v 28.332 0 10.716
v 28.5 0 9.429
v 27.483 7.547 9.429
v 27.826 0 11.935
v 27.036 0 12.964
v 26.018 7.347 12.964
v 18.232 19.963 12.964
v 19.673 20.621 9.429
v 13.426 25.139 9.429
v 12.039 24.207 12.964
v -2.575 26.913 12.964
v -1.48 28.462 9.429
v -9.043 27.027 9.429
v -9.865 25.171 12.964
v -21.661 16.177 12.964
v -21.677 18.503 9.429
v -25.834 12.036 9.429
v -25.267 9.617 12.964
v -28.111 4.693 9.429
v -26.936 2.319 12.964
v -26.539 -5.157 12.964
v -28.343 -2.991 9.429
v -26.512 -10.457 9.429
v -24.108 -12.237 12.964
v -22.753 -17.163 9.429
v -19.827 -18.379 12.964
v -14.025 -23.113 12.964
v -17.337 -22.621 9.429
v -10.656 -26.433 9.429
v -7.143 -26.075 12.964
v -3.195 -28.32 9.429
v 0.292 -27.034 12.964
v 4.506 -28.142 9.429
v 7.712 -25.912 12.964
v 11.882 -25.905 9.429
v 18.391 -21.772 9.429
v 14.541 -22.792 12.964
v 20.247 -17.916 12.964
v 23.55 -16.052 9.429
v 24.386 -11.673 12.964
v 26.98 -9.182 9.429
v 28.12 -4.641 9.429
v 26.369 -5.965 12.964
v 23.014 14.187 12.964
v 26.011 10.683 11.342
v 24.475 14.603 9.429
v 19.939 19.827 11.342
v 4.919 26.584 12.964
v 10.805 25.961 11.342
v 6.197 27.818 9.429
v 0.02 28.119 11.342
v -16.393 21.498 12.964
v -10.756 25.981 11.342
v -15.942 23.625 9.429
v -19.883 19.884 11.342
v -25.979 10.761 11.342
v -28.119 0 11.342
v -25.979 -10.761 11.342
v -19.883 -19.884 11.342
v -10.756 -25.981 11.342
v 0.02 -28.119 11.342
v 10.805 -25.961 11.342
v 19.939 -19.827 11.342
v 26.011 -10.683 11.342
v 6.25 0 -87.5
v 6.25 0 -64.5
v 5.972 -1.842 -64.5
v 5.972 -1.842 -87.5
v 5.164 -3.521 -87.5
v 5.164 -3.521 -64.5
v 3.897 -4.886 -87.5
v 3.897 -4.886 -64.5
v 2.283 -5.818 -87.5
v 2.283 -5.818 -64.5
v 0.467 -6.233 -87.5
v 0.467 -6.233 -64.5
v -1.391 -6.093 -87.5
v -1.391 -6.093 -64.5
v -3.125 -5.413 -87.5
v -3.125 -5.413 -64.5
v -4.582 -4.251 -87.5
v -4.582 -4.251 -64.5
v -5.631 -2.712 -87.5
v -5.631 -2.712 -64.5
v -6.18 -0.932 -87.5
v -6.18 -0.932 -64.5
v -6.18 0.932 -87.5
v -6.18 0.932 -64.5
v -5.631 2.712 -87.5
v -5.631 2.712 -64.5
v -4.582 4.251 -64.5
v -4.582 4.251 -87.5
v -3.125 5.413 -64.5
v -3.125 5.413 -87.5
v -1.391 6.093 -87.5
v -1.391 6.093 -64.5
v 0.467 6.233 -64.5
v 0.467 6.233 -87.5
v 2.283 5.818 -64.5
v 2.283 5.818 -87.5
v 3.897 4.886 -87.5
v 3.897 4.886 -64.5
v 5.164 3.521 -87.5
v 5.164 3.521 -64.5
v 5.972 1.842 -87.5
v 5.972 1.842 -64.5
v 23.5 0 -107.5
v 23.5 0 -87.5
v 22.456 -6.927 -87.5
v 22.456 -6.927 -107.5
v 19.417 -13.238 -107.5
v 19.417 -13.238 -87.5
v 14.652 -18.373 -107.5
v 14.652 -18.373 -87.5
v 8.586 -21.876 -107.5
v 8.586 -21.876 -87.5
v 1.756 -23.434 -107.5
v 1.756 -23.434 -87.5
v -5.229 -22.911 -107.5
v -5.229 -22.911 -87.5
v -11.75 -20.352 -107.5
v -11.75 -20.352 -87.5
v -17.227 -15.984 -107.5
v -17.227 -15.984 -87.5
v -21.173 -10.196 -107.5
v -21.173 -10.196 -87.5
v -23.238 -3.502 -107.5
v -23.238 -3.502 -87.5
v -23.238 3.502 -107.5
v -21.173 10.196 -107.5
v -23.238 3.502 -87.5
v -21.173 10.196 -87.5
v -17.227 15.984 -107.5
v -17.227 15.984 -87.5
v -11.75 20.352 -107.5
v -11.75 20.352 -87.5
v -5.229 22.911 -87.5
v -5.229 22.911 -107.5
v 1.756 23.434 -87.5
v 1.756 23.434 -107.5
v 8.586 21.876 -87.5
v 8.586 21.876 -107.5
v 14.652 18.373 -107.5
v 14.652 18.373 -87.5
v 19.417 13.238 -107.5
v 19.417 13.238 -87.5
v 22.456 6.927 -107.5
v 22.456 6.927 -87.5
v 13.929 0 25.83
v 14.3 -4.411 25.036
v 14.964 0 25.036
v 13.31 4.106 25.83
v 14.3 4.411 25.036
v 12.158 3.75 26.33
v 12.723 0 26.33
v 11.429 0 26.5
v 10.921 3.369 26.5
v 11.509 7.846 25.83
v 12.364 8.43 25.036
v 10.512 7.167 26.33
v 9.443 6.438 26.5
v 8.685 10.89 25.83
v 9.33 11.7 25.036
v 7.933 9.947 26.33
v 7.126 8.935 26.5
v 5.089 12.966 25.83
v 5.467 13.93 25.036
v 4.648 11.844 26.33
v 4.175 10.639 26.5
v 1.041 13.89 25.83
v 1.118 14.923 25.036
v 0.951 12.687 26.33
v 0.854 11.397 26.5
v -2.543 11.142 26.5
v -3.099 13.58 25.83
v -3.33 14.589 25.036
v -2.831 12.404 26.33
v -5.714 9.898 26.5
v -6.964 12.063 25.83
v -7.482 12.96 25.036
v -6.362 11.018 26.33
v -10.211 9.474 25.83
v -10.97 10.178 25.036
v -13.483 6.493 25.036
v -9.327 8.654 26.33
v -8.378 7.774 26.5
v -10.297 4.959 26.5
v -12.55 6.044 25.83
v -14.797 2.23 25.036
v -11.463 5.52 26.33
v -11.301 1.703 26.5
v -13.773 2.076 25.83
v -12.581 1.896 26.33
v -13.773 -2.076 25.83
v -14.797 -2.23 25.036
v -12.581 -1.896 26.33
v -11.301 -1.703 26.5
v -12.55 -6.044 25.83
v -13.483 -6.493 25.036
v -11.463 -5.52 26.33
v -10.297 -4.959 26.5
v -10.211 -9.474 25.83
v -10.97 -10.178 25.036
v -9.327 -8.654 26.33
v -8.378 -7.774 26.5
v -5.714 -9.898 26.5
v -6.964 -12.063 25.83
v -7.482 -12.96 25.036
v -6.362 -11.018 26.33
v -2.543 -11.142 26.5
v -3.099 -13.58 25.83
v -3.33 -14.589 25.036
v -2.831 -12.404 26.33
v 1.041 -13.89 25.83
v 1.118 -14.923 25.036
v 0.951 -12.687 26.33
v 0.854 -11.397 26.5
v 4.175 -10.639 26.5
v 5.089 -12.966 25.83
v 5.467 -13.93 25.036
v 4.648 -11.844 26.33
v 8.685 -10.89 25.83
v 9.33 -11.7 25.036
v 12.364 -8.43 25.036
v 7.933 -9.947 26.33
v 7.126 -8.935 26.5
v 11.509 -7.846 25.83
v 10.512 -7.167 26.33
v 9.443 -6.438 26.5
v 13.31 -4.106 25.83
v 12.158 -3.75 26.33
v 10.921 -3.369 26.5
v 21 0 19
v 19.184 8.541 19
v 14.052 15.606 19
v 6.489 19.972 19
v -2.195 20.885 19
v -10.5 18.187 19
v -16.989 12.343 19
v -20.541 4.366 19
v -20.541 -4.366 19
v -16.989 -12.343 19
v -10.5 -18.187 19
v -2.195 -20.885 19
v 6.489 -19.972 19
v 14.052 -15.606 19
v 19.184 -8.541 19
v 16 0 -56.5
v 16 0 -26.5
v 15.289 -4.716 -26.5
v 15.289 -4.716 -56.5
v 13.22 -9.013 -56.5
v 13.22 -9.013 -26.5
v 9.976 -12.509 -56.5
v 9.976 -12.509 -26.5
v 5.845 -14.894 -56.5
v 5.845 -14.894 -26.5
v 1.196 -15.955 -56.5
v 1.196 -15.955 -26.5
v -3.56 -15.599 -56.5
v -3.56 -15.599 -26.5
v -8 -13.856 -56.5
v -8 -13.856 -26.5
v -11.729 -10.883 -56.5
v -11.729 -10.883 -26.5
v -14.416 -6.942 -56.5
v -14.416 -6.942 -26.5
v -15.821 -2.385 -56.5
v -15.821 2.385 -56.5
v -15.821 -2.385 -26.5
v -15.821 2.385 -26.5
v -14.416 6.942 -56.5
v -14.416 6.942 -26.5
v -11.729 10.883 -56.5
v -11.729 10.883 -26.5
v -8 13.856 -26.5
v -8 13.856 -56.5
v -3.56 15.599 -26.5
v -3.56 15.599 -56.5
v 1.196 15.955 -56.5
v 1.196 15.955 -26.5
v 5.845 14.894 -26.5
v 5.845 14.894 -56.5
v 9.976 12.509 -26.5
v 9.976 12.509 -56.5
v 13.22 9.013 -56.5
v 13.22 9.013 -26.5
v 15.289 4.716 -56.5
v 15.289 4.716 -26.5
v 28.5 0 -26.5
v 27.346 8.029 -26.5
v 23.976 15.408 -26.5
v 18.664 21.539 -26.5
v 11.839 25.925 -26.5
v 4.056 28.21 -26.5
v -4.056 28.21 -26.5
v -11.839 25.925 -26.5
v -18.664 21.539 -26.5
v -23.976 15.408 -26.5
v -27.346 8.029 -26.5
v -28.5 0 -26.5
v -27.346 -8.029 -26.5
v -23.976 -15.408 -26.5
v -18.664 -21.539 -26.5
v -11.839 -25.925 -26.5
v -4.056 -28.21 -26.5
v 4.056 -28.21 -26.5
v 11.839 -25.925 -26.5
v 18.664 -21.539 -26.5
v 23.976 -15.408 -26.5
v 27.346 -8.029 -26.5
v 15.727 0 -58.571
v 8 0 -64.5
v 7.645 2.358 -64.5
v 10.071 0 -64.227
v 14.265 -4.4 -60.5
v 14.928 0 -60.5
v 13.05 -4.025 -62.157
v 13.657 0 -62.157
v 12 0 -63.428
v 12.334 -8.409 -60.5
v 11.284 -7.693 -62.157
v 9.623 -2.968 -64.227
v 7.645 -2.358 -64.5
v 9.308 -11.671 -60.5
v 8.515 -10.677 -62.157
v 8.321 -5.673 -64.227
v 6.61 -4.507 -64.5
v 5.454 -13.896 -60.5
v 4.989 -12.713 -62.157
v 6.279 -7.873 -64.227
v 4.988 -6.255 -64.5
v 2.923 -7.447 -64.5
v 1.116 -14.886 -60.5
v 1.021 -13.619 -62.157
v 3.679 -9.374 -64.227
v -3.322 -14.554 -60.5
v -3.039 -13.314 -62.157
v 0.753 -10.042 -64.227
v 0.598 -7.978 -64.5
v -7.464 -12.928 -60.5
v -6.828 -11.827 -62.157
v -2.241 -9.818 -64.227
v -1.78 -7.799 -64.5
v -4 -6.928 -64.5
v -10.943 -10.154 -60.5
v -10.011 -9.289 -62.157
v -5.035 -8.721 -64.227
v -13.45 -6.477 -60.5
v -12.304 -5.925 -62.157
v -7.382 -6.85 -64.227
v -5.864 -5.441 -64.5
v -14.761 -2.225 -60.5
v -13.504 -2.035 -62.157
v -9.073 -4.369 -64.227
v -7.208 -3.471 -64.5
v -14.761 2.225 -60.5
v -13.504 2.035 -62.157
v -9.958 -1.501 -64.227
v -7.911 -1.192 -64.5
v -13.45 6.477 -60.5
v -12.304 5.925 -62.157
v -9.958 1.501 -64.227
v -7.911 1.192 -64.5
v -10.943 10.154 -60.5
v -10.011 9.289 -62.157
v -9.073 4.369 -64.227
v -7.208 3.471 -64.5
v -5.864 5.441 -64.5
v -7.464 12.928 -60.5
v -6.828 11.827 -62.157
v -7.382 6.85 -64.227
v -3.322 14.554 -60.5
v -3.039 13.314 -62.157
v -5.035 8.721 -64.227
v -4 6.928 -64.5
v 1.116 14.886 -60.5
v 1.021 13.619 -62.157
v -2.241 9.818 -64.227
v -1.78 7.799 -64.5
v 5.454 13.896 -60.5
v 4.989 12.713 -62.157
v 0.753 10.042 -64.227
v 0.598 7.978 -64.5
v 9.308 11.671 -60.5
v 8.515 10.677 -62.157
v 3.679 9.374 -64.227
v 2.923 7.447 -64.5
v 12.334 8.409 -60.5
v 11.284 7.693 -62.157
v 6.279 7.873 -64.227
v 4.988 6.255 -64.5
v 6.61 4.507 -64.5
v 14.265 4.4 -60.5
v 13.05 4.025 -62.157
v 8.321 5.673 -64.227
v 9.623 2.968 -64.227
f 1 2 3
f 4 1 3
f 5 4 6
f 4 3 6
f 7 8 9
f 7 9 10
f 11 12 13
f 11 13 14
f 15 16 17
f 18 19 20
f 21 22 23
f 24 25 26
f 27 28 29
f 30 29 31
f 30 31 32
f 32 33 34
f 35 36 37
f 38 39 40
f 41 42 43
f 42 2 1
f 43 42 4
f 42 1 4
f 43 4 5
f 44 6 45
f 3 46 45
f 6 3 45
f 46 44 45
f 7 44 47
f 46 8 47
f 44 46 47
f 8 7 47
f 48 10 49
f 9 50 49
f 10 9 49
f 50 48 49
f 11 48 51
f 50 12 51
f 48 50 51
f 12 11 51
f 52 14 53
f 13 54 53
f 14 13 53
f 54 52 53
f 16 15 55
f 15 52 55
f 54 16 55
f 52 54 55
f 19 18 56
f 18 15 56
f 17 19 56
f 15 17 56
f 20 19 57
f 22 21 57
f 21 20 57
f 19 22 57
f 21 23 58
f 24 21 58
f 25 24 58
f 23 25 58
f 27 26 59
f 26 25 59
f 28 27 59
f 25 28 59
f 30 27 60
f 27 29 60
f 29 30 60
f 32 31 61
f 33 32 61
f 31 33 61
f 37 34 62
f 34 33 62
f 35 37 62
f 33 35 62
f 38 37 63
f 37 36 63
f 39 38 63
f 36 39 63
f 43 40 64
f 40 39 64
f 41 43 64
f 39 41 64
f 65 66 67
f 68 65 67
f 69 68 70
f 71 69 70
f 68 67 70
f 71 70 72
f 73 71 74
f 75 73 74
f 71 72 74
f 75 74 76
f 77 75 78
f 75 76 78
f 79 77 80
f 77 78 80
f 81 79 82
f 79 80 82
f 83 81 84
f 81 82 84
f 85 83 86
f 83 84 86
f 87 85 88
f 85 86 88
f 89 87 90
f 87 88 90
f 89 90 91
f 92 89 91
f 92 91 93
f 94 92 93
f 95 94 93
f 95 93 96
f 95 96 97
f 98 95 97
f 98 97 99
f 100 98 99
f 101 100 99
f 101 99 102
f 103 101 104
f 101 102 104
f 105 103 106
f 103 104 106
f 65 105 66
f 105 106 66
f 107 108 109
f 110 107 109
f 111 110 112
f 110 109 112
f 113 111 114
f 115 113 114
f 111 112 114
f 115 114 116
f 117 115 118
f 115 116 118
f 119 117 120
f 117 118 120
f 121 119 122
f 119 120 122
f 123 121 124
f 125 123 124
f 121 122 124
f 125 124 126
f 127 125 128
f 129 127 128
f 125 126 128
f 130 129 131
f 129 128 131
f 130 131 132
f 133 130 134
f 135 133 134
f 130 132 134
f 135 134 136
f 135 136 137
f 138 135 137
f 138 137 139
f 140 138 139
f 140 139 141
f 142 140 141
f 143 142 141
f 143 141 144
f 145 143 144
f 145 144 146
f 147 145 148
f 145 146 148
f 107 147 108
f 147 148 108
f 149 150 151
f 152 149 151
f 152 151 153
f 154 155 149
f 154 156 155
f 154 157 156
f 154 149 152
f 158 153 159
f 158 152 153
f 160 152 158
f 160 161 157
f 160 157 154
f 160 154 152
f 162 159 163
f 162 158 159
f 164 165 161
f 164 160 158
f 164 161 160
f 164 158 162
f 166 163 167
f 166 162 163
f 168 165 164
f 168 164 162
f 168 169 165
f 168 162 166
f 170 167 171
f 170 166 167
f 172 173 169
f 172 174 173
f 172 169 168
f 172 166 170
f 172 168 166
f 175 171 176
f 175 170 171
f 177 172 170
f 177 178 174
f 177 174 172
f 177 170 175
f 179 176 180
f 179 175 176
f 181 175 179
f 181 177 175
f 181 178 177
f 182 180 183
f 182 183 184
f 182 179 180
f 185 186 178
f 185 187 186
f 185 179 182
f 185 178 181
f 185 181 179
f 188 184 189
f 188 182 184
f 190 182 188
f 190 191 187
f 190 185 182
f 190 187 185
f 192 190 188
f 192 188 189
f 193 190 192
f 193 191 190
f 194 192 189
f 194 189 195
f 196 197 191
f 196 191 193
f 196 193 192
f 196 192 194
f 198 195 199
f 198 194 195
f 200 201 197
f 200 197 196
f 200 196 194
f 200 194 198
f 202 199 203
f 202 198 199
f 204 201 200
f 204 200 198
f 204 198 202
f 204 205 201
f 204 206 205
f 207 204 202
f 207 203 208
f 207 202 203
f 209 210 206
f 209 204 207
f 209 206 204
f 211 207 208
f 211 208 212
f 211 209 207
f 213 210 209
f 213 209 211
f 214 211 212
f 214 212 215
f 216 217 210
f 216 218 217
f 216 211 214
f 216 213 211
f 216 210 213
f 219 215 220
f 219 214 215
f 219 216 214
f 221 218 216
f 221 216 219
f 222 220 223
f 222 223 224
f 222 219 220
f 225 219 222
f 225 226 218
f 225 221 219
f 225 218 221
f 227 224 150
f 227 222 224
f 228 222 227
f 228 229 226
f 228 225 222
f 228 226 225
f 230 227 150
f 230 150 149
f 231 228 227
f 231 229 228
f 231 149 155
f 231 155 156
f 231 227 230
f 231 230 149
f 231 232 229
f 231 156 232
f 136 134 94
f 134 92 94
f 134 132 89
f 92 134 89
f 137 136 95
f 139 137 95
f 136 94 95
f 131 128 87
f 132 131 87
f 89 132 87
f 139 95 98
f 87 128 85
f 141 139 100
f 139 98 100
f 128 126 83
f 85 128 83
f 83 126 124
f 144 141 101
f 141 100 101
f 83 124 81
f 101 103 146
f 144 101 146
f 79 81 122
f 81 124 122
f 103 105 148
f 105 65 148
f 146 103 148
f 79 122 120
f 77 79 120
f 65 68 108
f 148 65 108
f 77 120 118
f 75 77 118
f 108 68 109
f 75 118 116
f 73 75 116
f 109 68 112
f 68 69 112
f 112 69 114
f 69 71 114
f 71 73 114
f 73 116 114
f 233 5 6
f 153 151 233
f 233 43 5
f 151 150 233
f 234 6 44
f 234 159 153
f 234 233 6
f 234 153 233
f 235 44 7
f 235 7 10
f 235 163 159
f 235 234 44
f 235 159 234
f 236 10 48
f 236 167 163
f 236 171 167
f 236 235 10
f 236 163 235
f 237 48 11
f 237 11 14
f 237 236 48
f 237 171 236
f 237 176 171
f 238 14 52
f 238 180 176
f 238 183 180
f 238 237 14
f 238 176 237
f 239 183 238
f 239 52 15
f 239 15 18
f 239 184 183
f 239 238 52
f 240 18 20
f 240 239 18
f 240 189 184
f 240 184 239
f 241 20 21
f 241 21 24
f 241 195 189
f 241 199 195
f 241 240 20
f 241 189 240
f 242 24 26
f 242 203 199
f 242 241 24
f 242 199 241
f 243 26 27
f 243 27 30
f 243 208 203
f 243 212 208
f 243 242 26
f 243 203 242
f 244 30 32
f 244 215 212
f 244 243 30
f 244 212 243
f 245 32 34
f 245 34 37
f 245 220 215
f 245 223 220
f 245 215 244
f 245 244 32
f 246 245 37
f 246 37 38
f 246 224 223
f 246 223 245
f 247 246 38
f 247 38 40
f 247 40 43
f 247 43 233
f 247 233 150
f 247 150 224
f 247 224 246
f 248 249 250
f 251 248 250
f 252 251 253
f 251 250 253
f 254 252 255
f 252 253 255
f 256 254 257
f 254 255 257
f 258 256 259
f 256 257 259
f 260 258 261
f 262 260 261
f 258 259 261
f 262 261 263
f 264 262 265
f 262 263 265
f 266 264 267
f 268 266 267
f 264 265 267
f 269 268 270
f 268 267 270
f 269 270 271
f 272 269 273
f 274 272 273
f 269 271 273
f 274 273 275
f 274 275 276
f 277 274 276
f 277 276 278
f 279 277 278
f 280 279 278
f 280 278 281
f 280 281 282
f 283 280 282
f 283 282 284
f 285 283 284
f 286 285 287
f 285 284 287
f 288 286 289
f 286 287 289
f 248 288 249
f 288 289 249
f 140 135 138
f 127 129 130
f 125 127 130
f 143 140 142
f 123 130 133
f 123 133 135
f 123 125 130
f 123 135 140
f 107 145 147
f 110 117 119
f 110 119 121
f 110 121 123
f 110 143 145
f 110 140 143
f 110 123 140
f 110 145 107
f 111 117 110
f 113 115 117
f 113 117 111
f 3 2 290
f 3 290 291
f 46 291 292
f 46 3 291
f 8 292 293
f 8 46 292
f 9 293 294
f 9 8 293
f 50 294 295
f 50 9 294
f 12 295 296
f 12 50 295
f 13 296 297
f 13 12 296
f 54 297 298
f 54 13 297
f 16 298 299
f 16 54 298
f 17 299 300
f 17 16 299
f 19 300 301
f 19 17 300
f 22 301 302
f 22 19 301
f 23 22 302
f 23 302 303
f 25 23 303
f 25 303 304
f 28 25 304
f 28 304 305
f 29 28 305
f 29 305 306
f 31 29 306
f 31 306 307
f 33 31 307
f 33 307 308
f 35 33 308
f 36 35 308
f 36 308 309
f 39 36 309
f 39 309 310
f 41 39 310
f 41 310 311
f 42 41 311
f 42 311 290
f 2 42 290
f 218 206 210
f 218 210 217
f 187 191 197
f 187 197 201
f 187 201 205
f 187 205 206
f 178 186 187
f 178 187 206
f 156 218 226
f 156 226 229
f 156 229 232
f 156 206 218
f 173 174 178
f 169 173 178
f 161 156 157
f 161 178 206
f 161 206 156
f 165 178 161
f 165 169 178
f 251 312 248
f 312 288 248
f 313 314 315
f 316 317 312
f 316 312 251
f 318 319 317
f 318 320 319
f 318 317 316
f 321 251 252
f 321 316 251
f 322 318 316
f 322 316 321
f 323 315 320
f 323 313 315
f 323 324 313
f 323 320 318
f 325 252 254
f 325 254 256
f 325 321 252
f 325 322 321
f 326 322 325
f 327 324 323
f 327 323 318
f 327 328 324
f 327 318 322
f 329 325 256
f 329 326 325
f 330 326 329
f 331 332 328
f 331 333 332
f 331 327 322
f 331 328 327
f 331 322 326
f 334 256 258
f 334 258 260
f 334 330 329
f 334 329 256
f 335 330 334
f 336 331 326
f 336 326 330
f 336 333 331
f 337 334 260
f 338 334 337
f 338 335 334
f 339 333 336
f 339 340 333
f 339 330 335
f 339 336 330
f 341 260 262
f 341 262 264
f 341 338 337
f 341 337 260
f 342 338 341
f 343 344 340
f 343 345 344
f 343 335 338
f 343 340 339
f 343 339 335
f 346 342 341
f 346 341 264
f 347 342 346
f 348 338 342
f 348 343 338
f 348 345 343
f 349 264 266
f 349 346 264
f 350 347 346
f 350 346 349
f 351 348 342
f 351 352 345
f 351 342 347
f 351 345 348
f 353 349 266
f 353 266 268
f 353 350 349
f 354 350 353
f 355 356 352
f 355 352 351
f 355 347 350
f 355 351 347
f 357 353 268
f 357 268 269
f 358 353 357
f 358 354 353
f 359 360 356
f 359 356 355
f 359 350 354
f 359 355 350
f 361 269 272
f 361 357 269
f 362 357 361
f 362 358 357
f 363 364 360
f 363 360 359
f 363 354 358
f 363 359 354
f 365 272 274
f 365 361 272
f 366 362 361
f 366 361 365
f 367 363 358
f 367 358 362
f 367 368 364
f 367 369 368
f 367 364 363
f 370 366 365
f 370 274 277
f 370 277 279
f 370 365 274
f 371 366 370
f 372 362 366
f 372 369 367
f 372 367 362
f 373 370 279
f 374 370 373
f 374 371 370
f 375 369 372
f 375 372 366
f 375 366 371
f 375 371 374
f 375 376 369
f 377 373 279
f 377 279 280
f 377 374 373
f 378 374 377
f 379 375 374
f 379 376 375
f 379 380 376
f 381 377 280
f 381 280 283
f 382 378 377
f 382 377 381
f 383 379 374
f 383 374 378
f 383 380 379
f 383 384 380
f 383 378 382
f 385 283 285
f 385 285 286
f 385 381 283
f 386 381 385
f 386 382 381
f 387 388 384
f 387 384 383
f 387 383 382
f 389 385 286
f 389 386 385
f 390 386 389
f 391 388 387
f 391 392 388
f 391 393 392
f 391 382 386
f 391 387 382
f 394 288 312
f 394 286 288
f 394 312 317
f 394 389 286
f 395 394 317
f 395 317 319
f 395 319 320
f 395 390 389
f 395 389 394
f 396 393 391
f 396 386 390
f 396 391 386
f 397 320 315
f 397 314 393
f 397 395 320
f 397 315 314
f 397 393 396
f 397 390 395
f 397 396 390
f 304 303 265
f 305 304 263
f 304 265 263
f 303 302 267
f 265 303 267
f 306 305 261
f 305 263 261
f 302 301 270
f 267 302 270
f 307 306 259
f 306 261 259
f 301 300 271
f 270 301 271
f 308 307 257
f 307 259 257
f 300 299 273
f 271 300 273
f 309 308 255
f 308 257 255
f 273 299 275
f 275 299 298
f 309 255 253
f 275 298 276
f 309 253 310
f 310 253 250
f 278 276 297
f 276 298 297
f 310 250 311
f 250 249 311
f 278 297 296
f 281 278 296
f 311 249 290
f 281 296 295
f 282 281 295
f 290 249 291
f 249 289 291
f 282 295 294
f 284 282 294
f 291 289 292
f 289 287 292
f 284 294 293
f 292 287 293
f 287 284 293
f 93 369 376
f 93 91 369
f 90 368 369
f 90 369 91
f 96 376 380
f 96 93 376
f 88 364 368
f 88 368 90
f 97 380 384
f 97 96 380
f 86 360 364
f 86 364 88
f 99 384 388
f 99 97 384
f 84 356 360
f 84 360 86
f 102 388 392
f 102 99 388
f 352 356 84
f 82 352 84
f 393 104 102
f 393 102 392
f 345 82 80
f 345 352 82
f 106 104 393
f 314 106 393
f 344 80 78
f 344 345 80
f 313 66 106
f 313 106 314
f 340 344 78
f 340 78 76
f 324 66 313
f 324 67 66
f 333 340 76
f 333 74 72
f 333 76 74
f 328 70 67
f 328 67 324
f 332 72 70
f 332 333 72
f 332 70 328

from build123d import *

# Parameters (mm, degrees)
F0_R      = 28.5
F1_DEPTH  = 26.5
F2_R      = 16
F3_DEPTH  = 38
F4_R      = 8
F5_SIZE   = 15
F6_R      = 5
F7_R      = 6.25
F8_DEPTH  = 23
F9_R      = 23.5
F10_DEPTH = 20


with BuildPart() as f1:
    # F0 (on Top) → F1 (new body, symmetric)
    with BuildSketch(Plane.XY):
        Circle(F0_R)
    extrude(amount=F1_DEPTH, both=True)

    # F2 (on face) → F3 (join)
    with BuildSketch(Plane(origin=(0, 0, -26.5), x_dir=(1, 0, 0), z_dir=(0, 0, -1))):
        Circle(F2_R)
    extrude(amount=F3_DEPTH)

    # F4
    f4_edges = [f1.edges().sort_by_distance(p)[0] for p in [
        (-16, 0, -64.5),
    ]]
    fillet(f4_edges, radius=F4_R)

    # F5
    f5_edges = [f1.edges().sort_by_distance(p)[0] for p in [
        (-28.5, 0, 26.5),
    ]]
    chamfer(f5_edges, length=F5_SIZE)

    # F6
    f6_edges = [f1.edges().sort_by_distance(p)[0] for p in [
        (-28.5, 0, 11.5),
        (-13.5, 0, 26.5),
    ]]
    fillet(f6_edges, radius=F6_R)

    # F7 (on face) → F8 (join)
    with BuildSketch(Plane(origin=(0, 0, -64.5), x_dir=(1, 0, 0), z_dir=(0, 0, -1))):
        Circle(F7_R)
    extrude(amount=F8_DEPTH)

    # F9 (on face) → F10 (join)
    with BuildSketch(Plane(origin=(0, 0, -87.5), x_dir=(1, 0, 0), z_dir=(0, 0, -1))):
        Circle(F9_R)
    extrude(amount=F10_DEPTH)


solid = f1.part
